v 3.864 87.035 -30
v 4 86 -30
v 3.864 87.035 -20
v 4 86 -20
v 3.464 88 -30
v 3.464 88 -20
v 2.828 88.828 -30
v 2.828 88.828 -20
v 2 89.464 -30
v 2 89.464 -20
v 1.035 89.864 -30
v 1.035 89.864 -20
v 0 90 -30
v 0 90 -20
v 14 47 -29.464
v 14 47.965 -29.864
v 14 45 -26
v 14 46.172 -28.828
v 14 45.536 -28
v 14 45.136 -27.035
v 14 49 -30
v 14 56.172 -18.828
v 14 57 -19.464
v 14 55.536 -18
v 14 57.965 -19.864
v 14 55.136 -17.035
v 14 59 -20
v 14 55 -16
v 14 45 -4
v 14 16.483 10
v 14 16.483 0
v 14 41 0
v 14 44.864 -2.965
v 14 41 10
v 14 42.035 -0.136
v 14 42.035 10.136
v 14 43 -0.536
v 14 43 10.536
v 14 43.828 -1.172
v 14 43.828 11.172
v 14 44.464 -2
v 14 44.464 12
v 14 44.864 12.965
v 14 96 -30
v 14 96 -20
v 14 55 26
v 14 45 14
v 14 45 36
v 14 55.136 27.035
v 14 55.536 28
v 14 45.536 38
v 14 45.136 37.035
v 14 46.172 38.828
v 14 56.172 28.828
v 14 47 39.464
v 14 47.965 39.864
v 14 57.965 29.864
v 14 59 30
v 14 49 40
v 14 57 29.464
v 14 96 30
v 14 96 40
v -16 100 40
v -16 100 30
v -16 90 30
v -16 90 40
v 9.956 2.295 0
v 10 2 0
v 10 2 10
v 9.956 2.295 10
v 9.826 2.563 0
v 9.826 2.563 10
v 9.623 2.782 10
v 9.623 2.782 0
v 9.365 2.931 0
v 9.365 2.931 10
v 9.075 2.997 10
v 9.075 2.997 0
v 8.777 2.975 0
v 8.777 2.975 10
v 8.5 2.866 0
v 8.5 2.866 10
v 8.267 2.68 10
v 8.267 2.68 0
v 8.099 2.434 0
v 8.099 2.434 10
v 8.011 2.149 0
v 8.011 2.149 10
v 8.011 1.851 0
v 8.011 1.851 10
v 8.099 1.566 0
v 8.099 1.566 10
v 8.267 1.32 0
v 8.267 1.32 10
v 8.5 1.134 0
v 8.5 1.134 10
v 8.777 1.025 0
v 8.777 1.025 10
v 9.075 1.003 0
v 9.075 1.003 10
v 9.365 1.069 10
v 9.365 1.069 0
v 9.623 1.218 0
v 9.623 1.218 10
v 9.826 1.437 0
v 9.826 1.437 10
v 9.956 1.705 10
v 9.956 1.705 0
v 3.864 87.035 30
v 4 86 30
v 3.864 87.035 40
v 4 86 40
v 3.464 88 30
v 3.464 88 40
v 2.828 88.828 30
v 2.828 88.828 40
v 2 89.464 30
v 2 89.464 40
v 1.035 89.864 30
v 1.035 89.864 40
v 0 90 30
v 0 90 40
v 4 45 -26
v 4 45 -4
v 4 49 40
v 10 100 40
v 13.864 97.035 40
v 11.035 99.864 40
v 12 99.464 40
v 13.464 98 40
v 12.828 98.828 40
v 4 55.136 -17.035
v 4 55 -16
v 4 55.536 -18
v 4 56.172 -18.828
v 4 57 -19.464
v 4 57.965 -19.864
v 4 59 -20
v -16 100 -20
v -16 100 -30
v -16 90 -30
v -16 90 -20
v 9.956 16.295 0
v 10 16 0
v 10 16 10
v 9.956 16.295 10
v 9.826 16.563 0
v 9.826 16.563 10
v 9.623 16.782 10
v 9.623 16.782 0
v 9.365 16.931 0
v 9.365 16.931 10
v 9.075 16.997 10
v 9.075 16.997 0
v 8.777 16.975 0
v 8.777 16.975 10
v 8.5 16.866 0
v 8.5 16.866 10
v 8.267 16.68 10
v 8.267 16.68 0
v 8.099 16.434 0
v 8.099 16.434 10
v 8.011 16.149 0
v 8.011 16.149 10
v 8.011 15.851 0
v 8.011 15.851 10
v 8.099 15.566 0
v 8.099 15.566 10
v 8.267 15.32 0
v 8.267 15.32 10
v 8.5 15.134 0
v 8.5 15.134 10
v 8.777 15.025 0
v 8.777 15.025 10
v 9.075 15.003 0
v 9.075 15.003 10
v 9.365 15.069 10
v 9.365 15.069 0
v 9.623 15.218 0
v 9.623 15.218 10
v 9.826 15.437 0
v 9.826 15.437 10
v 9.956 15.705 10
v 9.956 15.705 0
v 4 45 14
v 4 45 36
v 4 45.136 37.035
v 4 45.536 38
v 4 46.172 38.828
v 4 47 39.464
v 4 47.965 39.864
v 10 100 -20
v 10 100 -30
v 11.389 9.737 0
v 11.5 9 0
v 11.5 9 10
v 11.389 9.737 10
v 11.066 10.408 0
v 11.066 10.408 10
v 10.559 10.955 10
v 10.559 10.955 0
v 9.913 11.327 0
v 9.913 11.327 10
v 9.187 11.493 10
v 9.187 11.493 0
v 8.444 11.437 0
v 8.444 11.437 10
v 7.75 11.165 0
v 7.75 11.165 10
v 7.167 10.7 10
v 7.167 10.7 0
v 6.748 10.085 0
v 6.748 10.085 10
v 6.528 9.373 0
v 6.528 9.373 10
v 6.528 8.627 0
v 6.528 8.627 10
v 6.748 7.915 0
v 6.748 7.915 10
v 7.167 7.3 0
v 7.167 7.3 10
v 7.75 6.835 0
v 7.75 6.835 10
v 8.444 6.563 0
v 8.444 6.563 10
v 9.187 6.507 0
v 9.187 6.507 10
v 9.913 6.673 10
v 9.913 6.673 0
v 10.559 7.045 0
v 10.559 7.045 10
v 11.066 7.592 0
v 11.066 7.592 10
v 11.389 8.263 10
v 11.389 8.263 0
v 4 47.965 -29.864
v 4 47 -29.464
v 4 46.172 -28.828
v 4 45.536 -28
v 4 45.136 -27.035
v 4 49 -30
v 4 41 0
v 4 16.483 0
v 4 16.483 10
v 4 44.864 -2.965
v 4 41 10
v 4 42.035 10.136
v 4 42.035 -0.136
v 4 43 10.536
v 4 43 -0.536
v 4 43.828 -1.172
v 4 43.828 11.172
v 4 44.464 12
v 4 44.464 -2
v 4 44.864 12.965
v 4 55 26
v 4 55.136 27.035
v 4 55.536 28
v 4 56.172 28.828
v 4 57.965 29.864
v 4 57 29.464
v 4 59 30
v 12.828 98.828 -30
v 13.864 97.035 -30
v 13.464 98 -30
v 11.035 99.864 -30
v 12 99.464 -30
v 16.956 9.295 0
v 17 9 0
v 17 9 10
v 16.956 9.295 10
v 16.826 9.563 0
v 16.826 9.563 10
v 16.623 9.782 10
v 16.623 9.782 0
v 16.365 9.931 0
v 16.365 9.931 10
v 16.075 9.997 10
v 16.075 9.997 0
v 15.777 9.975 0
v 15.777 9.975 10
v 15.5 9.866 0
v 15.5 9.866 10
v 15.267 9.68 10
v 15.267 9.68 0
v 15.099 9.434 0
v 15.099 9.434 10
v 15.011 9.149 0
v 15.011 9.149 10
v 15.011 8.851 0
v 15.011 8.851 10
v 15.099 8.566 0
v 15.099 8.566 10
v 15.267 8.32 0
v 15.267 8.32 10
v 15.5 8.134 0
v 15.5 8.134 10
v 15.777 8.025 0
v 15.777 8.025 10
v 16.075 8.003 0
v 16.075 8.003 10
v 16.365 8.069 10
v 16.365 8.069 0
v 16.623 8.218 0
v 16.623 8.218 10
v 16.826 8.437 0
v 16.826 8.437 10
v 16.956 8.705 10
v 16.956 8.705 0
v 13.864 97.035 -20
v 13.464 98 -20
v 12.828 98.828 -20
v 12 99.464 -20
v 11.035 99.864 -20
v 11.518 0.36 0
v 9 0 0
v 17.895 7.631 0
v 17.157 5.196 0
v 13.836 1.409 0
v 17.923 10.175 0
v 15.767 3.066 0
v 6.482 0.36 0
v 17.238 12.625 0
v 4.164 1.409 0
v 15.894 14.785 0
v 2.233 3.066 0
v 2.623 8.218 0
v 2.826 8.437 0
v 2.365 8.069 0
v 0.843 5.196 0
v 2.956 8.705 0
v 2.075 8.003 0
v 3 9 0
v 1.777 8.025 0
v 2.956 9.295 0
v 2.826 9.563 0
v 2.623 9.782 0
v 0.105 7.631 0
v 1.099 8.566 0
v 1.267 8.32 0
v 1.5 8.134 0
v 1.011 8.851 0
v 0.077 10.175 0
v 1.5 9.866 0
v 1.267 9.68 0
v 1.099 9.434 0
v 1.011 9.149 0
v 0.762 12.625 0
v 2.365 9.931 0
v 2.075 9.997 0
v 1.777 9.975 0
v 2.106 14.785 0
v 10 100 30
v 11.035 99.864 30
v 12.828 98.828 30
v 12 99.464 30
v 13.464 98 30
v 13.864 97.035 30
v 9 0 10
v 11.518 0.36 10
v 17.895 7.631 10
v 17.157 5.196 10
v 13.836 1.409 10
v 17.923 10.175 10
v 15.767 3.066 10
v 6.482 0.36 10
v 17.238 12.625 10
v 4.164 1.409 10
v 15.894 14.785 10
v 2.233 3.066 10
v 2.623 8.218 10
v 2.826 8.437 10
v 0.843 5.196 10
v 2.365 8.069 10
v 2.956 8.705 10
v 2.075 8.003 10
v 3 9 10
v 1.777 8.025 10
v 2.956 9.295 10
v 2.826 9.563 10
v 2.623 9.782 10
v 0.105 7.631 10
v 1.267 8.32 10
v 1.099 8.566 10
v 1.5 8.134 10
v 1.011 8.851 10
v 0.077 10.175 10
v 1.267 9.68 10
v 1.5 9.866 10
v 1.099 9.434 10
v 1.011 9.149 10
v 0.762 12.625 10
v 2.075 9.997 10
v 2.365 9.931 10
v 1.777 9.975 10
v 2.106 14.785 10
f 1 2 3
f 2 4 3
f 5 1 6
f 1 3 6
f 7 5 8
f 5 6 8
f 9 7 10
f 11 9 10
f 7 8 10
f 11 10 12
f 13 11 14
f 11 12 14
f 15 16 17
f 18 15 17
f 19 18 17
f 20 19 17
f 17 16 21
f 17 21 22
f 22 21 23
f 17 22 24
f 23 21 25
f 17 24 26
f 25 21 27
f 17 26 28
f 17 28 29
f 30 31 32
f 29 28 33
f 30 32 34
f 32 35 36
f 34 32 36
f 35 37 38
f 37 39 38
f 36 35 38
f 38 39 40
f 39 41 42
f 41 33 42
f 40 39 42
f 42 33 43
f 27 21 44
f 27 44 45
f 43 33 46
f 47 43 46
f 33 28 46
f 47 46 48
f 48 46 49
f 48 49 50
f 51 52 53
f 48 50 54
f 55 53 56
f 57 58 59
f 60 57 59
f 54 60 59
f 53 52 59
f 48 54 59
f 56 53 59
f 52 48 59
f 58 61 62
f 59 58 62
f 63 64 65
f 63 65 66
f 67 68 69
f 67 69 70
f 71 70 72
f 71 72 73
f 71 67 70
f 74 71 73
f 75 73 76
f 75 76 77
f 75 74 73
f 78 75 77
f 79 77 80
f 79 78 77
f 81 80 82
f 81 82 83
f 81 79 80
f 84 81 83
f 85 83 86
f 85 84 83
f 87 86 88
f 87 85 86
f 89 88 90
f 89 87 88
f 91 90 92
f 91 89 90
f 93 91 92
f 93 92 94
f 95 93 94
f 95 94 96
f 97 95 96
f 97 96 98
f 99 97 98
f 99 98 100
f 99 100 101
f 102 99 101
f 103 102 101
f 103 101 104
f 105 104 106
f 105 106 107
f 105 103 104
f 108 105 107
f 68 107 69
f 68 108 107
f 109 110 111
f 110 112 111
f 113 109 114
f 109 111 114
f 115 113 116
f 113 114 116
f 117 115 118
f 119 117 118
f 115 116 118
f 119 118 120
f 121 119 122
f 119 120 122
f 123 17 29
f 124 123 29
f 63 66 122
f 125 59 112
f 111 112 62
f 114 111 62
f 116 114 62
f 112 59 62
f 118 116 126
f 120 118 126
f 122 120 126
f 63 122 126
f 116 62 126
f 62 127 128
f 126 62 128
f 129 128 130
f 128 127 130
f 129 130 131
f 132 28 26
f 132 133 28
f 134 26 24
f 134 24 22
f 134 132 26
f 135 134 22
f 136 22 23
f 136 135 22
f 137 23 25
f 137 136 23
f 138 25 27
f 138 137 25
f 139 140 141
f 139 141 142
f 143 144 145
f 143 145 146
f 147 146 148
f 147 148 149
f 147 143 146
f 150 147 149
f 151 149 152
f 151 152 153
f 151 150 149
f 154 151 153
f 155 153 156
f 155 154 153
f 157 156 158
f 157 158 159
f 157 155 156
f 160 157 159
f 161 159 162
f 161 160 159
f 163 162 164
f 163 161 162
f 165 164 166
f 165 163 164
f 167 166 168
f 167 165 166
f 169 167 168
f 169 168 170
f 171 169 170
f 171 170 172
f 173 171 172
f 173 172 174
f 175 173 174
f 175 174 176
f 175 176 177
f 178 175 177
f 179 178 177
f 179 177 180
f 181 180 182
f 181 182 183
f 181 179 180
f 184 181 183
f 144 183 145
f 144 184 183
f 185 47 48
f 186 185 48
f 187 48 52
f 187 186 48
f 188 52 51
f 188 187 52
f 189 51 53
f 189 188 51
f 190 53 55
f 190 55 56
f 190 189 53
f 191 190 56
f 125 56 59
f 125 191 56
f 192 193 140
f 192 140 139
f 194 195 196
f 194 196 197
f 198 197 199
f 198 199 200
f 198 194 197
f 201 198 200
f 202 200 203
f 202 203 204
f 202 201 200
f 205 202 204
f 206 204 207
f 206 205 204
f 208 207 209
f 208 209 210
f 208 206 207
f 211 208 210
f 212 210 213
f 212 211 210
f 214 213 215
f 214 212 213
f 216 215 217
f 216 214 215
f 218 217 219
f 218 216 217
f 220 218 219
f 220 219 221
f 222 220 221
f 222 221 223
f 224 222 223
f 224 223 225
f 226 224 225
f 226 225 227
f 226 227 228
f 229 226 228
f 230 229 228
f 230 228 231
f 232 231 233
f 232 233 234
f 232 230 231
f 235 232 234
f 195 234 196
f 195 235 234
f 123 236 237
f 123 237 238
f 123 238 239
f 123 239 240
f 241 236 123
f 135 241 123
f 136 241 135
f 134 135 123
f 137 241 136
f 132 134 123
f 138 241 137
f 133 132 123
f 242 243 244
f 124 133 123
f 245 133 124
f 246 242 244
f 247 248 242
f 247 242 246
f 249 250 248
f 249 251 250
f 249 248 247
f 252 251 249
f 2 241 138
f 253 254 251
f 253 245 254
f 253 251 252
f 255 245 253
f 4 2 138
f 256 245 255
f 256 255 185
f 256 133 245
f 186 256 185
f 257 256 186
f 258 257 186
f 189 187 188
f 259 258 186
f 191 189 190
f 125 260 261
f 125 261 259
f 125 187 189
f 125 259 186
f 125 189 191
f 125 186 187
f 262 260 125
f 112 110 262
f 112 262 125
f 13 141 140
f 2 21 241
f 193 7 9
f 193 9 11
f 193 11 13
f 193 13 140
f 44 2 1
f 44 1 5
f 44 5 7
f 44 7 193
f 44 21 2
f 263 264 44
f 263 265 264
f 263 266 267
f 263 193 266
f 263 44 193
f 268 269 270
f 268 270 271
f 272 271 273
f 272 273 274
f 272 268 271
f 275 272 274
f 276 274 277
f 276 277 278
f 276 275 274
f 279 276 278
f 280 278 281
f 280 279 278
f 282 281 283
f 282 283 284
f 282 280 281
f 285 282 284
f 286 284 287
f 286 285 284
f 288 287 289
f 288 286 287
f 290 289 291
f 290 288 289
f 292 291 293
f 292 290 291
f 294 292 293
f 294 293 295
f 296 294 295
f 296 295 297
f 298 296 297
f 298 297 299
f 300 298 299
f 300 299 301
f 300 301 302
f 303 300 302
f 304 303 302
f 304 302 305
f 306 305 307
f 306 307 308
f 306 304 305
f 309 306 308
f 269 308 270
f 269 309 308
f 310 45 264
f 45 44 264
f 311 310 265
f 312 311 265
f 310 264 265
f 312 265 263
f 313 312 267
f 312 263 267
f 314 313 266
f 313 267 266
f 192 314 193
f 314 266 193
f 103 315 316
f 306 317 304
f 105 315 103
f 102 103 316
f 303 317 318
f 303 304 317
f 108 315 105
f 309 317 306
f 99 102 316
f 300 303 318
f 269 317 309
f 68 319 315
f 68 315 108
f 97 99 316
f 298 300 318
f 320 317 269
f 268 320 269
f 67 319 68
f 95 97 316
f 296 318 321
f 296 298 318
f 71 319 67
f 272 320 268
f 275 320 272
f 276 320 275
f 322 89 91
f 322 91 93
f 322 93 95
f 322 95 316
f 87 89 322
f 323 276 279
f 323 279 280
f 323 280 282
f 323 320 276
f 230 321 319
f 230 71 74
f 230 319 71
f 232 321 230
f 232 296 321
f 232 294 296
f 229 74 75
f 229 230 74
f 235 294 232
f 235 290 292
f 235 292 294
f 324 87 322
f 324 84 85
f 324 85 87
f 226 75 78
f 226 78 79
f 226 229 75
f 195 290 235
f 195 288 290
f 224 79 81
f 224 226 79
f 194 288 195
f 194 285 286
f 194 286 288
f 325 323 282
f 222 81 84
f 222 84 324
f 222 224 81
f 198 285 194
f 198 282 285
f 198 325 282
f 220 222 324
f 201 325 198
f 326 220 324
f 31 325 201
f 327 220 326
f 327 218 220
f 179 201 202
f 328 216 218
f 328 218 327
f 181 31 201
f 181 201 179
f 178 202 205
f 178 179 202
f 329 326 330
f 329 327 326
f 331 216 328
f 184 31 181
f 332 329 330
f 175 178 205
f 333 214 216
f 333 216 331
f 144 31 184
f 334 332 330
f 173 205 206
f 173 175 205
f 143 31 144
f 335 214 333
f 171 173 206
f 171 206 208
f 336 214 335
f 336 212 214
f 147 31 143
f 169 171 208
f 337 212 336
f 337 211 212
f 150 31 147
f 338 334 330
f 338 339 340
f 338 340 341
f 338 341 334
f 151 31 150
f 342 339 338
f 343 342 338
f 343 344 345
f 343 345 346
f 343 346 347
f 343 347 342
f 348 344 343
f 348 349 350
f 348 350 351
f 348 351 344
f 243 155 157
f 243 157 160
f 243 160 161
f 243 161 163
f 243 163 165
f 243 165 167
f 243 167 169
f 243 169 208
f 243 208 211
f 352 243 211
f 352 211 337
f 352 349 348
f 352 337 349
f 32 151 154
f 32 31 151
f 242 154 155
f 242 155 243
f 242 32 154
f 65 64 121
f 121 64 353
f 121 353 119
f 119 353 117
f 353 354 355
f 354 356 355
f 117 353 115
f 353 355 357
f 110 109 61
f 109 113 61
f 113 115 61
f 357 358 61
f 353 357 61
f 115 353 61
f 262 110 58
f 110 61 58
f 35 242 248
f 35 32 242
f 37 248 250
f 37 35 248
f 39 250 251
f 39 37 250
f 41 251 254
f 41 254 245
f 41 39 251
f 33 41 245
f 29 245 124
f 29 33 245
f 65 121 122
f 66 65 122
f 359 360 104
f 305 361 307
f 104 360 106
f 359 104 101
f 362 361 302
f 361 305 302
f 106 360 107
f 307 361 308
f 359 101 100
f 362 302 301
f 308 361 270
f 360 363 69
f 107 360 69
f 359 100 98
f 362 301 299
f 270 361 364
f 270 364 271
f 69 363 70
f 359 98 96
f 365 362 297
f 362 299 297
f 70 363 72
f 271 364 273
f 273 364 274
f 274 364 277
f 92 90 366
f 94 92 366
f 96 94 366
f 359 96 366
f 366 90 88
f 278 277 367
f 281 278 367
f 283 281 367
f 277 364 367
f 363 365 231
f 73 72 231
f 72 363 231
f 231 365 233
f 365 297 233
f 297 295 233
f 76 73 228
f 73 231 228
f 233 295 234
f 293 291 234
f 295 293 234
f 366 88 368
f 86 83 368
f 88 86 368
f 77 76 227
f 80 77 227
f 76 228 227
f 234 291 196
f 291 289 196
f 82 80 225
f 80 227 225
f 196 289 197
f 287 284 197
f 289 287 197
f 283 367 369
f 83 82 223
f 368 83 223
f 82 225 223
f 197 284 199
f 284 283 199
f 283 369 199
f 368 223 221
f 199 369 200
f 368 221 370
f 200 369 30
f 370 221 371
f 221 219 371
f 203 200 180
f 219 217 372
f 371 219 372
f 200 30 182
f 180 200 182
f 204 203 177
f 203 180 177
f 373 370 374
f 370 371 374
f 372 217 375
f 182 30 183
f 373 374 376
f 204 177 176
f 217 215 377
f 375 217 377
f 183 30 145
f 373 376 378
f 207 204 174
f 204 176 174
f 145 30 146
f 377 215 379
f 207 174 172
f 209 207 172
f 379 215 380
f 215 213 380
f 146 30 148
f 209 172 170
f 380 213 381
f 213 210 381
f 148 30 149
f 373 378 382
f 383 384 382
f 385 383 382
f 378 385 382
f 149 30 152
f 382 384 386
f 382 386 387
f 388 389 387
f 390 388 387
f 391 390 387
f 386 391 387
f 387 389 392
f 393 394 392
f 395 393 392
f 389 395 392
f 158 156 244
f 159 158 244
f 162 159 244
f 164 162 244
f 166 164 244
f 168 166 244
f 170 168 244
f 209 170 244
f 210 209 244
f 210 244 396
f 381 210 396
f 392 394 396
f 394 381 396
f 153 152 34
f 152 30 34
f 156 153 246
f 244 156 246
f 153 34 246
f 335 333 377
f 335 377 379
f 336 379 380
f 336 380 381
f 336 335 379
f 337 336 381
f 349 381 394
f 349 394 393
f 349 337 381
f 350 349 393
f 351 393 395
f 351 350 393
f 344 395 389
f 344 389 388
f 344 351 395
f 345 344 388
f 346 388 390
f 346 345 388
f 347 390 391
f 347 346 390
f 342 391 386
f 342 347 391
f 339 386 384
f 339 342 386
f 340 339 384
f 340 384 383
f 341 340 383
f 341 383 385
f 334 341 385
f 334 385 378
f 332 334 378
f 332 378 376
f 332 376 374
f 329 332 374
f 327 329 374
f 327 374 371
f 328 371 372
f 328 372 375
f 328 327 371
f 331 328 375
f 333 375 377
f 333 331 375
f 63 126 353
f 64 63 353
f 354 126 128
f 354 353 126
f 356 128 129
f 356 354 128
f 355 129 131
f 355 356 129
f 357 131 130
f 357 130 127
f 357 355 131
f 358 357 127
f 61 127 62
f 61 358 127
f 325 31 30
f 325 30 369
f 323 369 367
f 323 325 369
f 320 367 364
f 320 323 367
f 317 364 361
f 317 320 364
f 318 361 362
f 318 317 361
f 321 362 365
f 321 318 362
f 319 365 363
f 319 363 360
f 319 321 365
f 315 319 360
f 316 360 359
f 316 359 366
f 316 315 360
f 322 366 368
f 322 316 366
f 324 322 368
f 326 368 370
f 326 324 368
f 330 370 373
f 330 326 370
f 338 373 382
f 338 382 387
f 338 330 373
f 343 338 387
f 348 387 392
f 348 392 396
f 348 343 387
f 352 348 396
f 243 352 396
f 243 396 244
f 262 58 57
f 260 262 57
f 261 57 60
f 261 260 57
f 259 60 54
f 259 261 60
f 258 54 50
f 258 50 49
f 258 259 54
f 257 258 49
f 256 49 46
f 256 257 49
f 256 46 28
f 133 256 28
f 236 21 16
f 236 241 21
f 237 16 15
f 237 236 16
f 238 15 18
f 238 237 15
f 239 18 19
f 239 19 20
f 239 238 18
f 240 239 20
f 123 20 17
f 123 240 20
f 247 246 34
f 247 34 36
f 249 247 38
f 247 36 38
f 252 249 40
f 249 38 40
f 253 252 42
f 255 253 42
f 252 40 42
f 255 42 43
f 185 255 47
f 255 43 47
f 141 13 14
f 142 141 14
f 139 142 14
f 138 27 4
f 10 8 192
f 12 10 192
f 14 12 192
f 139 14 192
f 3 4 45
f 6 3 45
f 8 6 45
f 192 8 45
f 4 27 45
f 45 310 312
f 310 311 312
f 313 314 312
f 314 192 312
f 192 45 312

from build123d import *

# Parameters (mm, degrees)
ESQUISSE1_R        = 2.5
ESQUISSE1_R_2      = 1
BOSS_EXTRU_1_DEPTH = 10
BOSS_EXTRU_2_DEPTH = 10
ESQUISSE5_W        = 10
ESQUISSE5_H        = 10
BOSS_EXTRU_3_DEPTH = 20
CONG_1_R           = 4


with BuildPart() as part:
    # Esquisse1 → Boss.-Extru.1 (new body)
    with BuildSketch(Plane.XY):
        with BuildLine():
            Line((4, 55), (14, 55))
            Line((14, 55), (14, 16.483314774))
            ThreePointArc((14, 16.483314774), (9, 0), (4, 16.483314774))
            Line((4, 16.483314774), (4, 55))
        make_face()
        with Locations((9, 9)):
            Circle(ESQUISSE1_R, mode=Mode.SUBTRACT)
        with Locations((9, 16)):
            Circle(ESQUISSE1_R_2, mode=Mode.SUBTRACT)
        with Locations((16, 9)):
            Circle(ESQUISSE1_R_2, mode=Mode.SUBTRACT)
        with Locations((9, 2)):
            Circle(ESQUISSE1_R_2, mode=Mode.SUBTRACT)
        with Locations((2, 9)):
            Circle(ESQUISSE1_R_2, mode=Mode.SUBTRACT)
    extrude(amount=BOSS_EXTRU_1_DEPTH)

    # Esquisse4 → Boss.-Extru.2 (add)
    with BuildSketch(Plane(origin=(14, 0, 0), x_dir=(0, 0, -1), z_dir=(1, 0, 0))):
        Polygon((-30, 55), (20, 55), (20, 100), (30, 100), (30, 45), (-40, 45), (-40, 100), (-30, 100), align=None)
    extrude(amount=-BOSS_EXTRU_2_DEPTH)

    # Esquisse5 → Boss.-Extru.3 (add)
    with BuildSketch(Plane.ZY.offset(-4)):
        with Locations((-25, 95)):
            Rectangle(ESQUISSE5_W, ESQUISSE5_H)
        with Locations((35, 95)):
            Rectangle(ESQUISSE5_W, ESQUISSE5_H)
    extrude(amount=BOSS_EXTRU_3_DEPTH)

    # Congé1
    cong_1_edges = [part.edges().sort_by_distance(p)[0] for p in [
        (9, 45, 0),
        (9, 45, -30),
        (14, 100, -25),
        (9, 55, -20),
        (9, 45, 10),
        (9, 45, 40),
        (9, 55, 30),
        (14, 100, 35),
        (4, 90, -25),
        (4, 90, 35),
    ]]
    fillet(cong_1_edges, radius=CONG_1_R)


solid = part.part
